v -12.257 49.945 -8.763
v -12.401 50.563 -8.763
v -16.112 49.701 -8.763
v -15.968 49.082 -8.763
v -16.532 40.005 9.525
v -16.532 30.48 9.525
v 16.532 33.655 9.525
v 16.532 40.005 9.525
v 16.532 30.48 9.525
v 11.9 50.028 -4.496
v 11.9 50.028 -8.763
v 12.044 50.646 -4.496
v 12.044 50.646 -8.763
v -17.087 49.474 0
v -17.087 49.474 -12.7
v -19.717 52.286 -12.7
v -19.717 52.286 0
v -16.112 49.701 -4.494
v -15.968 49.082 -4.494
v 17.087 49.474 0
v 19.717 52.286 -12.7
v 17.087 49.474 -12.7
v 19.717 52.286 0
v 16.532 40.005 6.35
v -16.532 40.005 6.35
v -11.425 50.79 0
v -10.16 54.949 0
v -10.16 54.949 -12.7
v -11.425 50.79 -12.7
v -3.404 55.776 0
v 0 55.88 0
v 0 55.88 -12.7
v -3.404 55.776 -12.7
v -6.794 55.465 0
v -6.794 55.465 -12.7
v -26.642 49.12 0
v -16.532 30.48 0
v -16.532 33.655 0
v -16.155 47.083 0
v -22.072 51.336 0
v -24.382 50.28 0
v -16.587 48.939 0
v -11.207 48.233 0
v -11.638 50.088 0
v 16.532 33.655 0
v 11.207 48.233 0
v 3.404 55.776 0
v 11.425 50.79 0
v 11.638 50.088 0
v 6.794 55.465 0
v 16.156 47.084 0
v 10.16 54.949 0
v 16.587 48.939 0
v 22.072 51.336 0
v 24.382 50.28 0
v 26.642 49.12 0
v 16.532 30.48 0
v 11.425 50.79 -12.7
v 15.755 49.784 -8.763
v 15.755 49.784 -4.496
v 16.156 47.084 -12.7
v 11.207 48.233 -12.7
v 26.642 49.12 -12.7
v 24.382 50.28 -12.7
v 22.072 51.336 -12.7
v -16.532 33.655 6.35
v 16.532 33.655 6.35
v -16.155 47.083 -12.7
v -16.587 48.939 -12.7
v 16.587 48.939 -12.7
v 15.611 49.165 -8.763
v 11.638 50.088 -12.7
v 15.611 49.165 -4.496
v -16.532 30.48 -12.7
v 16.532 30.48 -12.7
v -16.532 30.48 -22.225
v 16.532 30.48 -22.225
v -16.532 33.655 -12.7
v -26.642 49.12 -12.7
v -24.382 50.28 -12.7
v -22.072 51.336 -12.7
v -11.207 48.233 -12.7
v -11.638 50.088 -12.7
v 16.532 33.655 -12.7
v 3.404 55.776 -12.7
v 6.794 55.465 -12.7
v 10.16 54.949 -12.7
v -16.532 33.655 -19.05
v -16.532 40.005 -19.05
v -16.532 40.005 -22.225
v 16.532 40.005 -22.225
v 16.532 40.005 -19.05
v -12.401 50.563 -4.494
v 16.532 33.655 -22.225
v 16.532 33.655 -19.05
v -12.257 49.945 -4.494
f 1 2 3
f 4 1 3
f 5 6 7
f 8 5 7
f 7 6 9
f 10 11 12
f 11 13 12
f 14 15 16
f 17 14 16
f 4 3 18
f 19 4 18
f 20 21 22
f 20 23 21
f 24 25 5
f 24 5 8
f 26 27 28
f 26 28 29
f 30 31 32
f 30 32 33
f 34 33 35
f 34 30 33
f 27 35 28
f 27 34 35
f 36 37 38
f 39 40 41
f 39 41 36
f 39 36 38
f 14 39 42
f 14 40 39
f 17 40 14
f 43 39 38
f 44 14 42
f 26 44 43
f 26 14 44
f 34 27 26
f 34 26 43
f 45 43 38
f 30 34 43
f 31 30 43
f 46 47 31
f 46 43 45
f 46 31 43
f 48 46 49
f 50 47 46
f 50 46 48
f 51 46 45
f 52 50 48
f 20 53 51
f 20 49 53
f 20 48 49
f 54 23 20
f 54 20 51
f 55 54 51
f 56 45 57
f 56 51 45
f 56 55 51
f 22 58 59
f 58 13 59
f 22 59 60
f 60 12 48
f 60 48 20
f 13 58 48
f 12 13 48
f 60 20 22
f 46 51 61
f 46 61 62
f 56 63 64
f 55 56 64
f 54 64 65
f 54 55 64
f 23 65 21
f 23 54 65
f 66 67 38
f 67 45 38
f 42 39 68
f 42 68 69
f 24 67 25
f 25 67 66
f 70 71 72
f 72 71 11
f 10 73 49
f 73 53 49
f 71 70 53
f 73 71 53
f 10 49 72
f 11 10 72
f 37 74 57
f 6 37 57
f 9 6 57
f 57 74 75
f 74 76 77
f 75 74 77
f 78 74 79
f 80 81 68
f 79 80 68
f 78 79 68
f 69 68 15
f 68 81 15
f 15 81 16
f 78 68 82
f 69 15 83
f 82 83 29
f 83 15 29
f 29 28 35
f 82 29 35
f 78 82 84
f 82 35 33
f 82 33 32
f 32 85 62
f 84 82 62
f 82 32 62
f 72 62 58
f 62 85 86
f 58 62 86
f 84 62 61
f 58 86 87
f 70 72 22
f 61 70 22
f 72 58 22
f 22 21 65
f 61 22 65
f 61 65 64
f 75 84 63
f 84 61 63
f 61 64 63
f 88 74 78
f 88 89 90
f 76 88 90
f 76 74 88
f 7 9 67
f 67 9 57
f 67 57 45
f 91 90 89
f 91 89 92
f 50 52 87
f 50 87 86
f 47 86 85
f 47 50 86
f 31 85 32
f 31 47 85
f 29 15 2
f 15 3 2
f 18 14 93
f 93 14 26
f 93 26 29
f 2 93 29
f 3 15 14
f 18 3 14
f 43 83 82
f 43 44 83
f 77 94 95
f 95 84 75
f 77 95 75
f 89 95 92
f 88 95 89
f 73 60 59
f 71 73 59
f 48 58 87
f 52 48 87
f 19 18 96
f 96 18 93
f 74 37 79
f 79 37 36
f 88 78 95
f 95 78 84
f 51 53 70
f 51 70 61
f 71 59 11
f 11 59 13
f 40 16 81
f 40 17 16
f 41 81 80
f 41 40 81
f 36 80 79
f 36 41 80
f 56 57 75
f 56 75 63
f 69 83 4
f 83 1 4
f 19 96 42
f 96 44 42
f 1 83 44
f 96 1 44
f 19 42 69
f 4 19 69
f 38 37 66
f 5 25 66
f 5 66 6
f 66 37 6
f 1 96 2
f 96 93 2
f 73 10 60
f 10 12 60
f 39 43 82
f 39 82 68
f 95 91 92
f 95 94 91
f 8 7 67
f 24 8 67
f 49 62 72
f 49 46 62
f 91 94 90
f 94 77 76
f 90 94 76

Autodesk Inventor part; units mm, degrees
ref_plane "YZ Plane" through (0, 0, 0) normal (1, 0, 0) x (0, 1, 0)
ref_plane "XZ Plane" through (0, 0, 0) normal (0, 1, 0) x (-1, 0, 0)
ref_plane "XY Plane" through (0, 0, 0) normal (0, 0, 1) x (1, 0, 0)
sketch "Sketch1" plane through (0, 0, 0) normal (0, 0, 1) x (1, 0, 0)
  line L0 (-46.8353, 30.48) -> (46.8353, 30.48)
  arc A0 (0, 55.88) -> (-46.8353, 30.48) centre (0, 0) ccw
  arc A1 (46.8353, 30.48) -> (0, 55.88) centre (0, 0) ccw
extrude "Extrusion1" add sketch "Sketch1" against normal blind 12.7
sketch "Sketch2" plane through (0, 0, 0) normal (0, 0, 1) x (1, 0, 0)
  line L0 (-46.8353, 30.48) -> (46.8353, 30.48) projected
  arc A0 (46.8353, 30.48) -> (-46.8353, 30.48) centre (0, 0) ccw projected
  line L1 (0, 55.88) -> (0, 0)
  line L2 (0, 0) -> (46.8353, 30.48)
  line L3 (-46.8353, 30.48) -> (0, 0)
  line L4 (0, 0) -> (-26.6416, 49.1203)
  line L5 (0, 0) -> (26.6416, 49.1203)
  line L6 (-16.5866, 48.9387) -> (-20.0564, 52.6491)
  line L7 (-20.0564, 52.6491) -> (-18.578, 57.5092)
  line L8 (-18.578, 57.5092) -> (-13.6298, 58.659)
  line L9 (-13.6298, 58.659) -> (-10.16, 54.9486)
  line L10 (-10.16, 54.9486) -> (-11.6384, 50.0885)
  line L11 (-11.6384, 50.0885) -> (-16.5866, 48.9387)
  line L12 (16.5866, 48.9387) -> (11.6384, 50.0885)
  line L13 (11.6384, 50.0885) -> (10.16, 54.9486)
  line L14 (10.16, 54.9486) -> (13.6298, 58.659)
  line L15 (13.6298, 58.659) -> (18.578, 57.5092)
  line L16 (18.578, 57.5092) -> (20.0564, 52.6491)
  line L17 (20.0564, 52.6491) -> (16.5866, 48.9387)
  line L18 (11.6384, 50.0885) -> (16.5866, 48.9387)
  line L19 (16.5866, 48.9387) -> (16.1555, 47.0836)
  line L20 (16.1555, 47.0836) -> (11.2073, 48.2333)
  line L21 (11.2073, 48.2333) -> (11.6384, 50.0885)
  line L22 (-16.5866, 48.9387) -> (-11.6384, 50.0885)
  line L23 (-11.6384, 50.0885) -> (-11.2072, 48.2329)
  line L24 (-11.2072, 48.2329) -> (-16.1554, 47.0832)
  line L25 (-16.1554, 47.0832) -> (-16.5866, 48.9387)
  line L26 (-17.0874, 49.4743) -> (-11.425, 50.79)
  line L27 (11.425, 50.79) -> (17.0874, 49.4743)
  point P0 (-15.1082, 53.7989)
  point P1 (15.1082, 53.7989)
  dimension "d8" = 28.47
  dimension "d9" = 28.47
  dimension "d18" = 5.08
  dimension "d19" = 5.08
  dimension "d20" = 10.16
  dimension "d21" = 10.16
  dimension "d22" = 1.905
  dimension "d23" = 1.9046
  dimension "d24" = 0.635
  dimension "d25" = 0.635
extrude "Extrusion2" cut sketch "Sketch2" against normal blind 12.7 contours A0 L4 L0 | L0 L4 L3 | L5 L0 L2 | L6 L7 L8 L9 A0 | A0 L10 L26 L6 | L0 L5 A0 | L14 L15 L16 L17 A0 | A0 L17 L27 L13 | L11 L23 L24 L25 | L12 L19 L20 L21
sketch "Sketch3" plane through (-17.0874, 49.4743, 0) normal (-0.2263272, 0.9740513, 0) x (0.9740513, 0.2263272, 0)
  line L0 (0, 0) -> (0, 12.7) projected
  line L1 (1.0016, 8.763) -> (1.0016, 4.4937)
  line L2 (1.0016, 4.4937) -> (4.8116, 4.4937)
  line L3 (4.8116, 4.4937) -> (4.8116, 8.763)
  line L4 (4.8116, 8.763) -> (1.0016, 8.763)
  point P0 (5.8132, 12.7)
  point P1 (5.4466, 0)
  dimension "d28" = 0.635
  dimension "d29" = 3.81
  dimension "d30" = 3.937
extrude "Extrusion3" cut sketch "Sketch3" against normal up to next
sketch "Sketch4" plane through (11.425, 50.79, 0) normal (0.2263272, 0.9740513, 0) x (0.9740513, -0.2263272, 0)
  line L0 (0, 0) -> (0, 12.7) projected
  line L1 (0.635, 8.763) -> (0.635, 4.4958)
  line L2 (0.635, 4.4958) -> (4.445, 4.4958)
  line L3 (4.445, 4.4958) -> (4.445, 8.763)
  line L4 (4.445, 8.763) -> (0.635, 8.763)
  point P0 (0.3666, 0)
  dimension "d33" = 3.81
  dimension "d34" = 3.937
  dimension "d35" = 0.635
  dimension "d36" = 4.2672
extrude "Extrusion4" cut sketch "Sketch4" against normal up to next
sketch "Sketch5" plane through (0, 0, -12.7) normal (0, 0, -1) x (-1, 0, 0)
  line L0 (16.5316, 30.48) -> (-16.5316, 30.48) projected
  line L1 (-16.5316, 30.48) -> (16.5316, 30.48)
  line L2 (16.5316, 30.48) -> (16.5316, 33.655)
  line L3 (16.5316, 33.655) -> (-16.5316, 33.655)
  line L4 (-16.5316, 33.655) -> (-16.5316, 30.48)
  dimension "d39" = 3.175
extrude "Extrusion5" add sketch "Sketch5" along normal blind 9.525
sketch "Sketch7" plane through (-16.5316, 33.655, -12.7) normal (0, 1, 0) x (1, 0, 0)
  line L0 (33.0631, 9.525) -> (0, 9.525) projected
  line L1 (0, 9.525) -> (33.0631, 9.525)
  line L2 (33.0631, 9.525) -> (33.0631, 6.35)
  line L3 (33.0631, 6.35) -> (0, 6.35)
  line L4 (0, 6.35) -> (0, 9.525)
  point P0 (16.5316, -12.7)
  dimension "d42" = 3.175
extrude "Extrusion6" add sketch "Sketch7" along normal blind 6.35
sketch "Sketch8" plane through (0, 0, 0) normal (0, 0, 1) x (1, 0, 0)
  line L0 (-16.5316, 30.48) -> (16.5316, 30.48) projected
  line L1 (-16.5316, 30.48) -> (16.5316, 30.48)
  line L2 (16.5316, 30.48) -> (16.5316, 33.655)
  line L3 (16.5316, 33.655) -> (-16.5316, 33.655)
  line L4 (-16.5316, 33.655) -> (-16.5316, 30.48)
  dimension "d45" = 3.175
extrude "Extrusion7" add sketch "Sketch8" along normal blind 9.525
sketch "Sketch9" plane through (-16.5316, 33.655, 0) normal (0, 1, 0) x (1, 0, 0)
  line L0 (0, -9.525) -> (33.0631, -9.525) projected
  line L1 (0, -9.525) -> (33.0631, -9.525)
  line L2 (33.0631, -9.525) -> (33.0631, -6.35)
  line L3 (33.0631, -6.35) -> (0, -6.35)
  line L4 (0, -6.35) -> (0, -9.525)
  point P0 (16.5316, 0)
  dimension "d48" = 3.175
extrude "Extrusion8" add sketch "Sketch9" along normal blind 6.35
properties part number "IR Sensor Piece Ver 2"
